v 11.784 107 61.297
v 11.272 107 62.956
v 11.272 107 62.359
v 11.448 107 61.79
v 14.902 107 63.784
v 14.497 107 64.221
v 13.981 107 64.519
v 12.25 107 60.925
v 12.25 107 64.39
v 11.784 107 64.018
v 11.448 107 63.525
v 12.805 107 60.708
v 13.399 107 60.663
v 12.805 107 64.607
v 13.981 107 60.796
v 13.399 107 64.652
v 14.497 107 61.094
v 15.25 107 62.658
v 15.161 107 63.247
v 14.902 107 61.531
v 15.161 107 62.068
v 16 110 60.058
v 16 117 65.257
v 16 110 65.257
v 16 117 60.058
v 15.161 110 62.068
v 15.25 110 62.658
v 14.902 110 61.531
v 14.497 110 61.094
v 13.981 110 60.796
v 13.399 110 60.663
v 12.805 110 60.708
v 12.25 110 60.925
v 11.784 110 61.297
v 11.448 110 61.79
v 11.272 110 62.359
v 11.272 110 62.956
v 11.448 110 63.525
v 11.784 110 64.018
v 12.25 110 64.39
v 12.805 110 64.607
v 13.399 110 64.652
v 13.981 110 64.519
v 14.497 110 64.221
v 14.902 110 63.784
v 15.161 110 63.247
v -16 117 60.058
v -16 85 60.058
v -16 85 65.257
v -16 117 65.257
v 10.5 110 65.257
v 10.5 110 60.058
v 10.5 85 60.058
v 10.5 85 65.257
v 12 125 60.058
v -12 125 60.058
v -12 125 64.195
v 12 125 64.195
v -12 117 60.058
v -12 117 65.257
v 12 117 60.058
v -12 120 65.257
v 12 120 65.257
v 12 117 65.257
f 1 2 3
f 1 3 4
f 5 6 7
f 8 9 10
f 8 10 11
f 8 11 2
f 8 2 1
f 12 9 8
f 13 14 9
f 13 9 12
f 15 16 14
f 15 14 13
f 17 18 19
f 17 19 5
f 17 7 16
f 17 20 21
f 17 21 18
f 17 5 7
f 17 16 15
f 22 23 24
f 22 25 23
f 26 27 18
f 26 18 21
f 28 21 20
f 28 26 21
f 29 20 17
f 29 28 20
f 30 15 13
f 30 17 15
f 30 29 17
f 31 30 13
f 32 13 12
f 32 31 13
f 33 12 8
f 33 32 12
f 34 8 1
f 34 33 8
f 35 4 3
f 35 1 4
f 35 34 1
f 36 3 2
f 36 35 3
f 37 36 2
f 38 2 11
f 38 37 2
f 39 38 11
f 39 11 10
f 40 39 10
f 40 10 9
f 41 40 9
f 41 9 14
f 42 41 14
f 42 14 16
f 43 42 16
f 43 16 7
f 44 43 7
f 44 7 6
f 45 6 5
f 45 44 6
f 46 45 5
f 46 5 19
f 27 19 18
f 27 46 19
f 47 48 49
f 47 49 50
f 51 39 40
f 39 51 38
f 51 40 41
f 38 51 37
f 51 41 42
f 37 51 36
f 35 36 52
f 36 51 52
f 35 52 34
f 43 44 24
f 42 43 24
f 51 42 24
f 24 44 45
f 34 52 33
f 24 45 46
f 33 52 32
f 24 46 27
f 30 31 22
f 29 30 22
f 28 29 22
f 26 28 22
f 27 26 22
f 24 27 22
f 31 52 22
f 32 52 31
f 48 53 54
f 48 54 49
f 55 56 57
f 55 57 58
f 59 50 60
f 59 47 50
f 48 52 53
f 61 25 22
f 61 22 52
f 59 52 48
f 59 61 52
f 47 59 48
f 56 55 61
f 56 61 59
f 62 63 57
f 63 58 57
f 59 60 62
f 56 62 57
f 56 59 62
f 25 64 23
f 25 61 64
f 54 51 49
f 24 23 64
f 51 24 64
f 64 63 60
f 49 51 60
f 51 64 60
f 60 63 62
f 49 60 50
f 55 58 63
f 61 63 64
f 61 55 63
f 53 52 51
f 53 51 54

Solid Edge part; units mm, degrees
sketch "Sketch1" plane through (0, 0, 60.0575) normal (0, 0, 1) x (1, 0, 0)
  line L0 (12, 117) -> (16, 117)
  line L1 (16, 117) -> (16, 110)
  line L2 (10.5, 110) -> (16, 110)
  line L3 (10.5, 110) -> (10.5, 85)
  line L4 (10.5, 85) -> (-16, 85)
  line L5 (-16, 85) -> (-16, 117)
  line L6 (-16, 117) -> (-12, 117)
  line L7 (-12, 117) -> (-12, 125)
  line L8 (-12, 125) -> (12, 125)
  line L9 (12, 125) -> (12, 117)
extrude "Protrusion1" add sketch "Sketch1" along normal blind 5.2
sketch "Sketch2" plane through (13.25, 110, 62.5575) normal (0, -1, 0) x (1, 0, 0)
  circle A0 centre (0, 0.1) radius 2
extrude "ExtrudedProtrusion_3" add sketch "Sketch2" along normal blind 3
chamfer "Chamfer_1" distance 5 angle 12 1 edges at (0, 125, 65.2575) measured on face at (10.9867, 118.7333, 65.2575)
